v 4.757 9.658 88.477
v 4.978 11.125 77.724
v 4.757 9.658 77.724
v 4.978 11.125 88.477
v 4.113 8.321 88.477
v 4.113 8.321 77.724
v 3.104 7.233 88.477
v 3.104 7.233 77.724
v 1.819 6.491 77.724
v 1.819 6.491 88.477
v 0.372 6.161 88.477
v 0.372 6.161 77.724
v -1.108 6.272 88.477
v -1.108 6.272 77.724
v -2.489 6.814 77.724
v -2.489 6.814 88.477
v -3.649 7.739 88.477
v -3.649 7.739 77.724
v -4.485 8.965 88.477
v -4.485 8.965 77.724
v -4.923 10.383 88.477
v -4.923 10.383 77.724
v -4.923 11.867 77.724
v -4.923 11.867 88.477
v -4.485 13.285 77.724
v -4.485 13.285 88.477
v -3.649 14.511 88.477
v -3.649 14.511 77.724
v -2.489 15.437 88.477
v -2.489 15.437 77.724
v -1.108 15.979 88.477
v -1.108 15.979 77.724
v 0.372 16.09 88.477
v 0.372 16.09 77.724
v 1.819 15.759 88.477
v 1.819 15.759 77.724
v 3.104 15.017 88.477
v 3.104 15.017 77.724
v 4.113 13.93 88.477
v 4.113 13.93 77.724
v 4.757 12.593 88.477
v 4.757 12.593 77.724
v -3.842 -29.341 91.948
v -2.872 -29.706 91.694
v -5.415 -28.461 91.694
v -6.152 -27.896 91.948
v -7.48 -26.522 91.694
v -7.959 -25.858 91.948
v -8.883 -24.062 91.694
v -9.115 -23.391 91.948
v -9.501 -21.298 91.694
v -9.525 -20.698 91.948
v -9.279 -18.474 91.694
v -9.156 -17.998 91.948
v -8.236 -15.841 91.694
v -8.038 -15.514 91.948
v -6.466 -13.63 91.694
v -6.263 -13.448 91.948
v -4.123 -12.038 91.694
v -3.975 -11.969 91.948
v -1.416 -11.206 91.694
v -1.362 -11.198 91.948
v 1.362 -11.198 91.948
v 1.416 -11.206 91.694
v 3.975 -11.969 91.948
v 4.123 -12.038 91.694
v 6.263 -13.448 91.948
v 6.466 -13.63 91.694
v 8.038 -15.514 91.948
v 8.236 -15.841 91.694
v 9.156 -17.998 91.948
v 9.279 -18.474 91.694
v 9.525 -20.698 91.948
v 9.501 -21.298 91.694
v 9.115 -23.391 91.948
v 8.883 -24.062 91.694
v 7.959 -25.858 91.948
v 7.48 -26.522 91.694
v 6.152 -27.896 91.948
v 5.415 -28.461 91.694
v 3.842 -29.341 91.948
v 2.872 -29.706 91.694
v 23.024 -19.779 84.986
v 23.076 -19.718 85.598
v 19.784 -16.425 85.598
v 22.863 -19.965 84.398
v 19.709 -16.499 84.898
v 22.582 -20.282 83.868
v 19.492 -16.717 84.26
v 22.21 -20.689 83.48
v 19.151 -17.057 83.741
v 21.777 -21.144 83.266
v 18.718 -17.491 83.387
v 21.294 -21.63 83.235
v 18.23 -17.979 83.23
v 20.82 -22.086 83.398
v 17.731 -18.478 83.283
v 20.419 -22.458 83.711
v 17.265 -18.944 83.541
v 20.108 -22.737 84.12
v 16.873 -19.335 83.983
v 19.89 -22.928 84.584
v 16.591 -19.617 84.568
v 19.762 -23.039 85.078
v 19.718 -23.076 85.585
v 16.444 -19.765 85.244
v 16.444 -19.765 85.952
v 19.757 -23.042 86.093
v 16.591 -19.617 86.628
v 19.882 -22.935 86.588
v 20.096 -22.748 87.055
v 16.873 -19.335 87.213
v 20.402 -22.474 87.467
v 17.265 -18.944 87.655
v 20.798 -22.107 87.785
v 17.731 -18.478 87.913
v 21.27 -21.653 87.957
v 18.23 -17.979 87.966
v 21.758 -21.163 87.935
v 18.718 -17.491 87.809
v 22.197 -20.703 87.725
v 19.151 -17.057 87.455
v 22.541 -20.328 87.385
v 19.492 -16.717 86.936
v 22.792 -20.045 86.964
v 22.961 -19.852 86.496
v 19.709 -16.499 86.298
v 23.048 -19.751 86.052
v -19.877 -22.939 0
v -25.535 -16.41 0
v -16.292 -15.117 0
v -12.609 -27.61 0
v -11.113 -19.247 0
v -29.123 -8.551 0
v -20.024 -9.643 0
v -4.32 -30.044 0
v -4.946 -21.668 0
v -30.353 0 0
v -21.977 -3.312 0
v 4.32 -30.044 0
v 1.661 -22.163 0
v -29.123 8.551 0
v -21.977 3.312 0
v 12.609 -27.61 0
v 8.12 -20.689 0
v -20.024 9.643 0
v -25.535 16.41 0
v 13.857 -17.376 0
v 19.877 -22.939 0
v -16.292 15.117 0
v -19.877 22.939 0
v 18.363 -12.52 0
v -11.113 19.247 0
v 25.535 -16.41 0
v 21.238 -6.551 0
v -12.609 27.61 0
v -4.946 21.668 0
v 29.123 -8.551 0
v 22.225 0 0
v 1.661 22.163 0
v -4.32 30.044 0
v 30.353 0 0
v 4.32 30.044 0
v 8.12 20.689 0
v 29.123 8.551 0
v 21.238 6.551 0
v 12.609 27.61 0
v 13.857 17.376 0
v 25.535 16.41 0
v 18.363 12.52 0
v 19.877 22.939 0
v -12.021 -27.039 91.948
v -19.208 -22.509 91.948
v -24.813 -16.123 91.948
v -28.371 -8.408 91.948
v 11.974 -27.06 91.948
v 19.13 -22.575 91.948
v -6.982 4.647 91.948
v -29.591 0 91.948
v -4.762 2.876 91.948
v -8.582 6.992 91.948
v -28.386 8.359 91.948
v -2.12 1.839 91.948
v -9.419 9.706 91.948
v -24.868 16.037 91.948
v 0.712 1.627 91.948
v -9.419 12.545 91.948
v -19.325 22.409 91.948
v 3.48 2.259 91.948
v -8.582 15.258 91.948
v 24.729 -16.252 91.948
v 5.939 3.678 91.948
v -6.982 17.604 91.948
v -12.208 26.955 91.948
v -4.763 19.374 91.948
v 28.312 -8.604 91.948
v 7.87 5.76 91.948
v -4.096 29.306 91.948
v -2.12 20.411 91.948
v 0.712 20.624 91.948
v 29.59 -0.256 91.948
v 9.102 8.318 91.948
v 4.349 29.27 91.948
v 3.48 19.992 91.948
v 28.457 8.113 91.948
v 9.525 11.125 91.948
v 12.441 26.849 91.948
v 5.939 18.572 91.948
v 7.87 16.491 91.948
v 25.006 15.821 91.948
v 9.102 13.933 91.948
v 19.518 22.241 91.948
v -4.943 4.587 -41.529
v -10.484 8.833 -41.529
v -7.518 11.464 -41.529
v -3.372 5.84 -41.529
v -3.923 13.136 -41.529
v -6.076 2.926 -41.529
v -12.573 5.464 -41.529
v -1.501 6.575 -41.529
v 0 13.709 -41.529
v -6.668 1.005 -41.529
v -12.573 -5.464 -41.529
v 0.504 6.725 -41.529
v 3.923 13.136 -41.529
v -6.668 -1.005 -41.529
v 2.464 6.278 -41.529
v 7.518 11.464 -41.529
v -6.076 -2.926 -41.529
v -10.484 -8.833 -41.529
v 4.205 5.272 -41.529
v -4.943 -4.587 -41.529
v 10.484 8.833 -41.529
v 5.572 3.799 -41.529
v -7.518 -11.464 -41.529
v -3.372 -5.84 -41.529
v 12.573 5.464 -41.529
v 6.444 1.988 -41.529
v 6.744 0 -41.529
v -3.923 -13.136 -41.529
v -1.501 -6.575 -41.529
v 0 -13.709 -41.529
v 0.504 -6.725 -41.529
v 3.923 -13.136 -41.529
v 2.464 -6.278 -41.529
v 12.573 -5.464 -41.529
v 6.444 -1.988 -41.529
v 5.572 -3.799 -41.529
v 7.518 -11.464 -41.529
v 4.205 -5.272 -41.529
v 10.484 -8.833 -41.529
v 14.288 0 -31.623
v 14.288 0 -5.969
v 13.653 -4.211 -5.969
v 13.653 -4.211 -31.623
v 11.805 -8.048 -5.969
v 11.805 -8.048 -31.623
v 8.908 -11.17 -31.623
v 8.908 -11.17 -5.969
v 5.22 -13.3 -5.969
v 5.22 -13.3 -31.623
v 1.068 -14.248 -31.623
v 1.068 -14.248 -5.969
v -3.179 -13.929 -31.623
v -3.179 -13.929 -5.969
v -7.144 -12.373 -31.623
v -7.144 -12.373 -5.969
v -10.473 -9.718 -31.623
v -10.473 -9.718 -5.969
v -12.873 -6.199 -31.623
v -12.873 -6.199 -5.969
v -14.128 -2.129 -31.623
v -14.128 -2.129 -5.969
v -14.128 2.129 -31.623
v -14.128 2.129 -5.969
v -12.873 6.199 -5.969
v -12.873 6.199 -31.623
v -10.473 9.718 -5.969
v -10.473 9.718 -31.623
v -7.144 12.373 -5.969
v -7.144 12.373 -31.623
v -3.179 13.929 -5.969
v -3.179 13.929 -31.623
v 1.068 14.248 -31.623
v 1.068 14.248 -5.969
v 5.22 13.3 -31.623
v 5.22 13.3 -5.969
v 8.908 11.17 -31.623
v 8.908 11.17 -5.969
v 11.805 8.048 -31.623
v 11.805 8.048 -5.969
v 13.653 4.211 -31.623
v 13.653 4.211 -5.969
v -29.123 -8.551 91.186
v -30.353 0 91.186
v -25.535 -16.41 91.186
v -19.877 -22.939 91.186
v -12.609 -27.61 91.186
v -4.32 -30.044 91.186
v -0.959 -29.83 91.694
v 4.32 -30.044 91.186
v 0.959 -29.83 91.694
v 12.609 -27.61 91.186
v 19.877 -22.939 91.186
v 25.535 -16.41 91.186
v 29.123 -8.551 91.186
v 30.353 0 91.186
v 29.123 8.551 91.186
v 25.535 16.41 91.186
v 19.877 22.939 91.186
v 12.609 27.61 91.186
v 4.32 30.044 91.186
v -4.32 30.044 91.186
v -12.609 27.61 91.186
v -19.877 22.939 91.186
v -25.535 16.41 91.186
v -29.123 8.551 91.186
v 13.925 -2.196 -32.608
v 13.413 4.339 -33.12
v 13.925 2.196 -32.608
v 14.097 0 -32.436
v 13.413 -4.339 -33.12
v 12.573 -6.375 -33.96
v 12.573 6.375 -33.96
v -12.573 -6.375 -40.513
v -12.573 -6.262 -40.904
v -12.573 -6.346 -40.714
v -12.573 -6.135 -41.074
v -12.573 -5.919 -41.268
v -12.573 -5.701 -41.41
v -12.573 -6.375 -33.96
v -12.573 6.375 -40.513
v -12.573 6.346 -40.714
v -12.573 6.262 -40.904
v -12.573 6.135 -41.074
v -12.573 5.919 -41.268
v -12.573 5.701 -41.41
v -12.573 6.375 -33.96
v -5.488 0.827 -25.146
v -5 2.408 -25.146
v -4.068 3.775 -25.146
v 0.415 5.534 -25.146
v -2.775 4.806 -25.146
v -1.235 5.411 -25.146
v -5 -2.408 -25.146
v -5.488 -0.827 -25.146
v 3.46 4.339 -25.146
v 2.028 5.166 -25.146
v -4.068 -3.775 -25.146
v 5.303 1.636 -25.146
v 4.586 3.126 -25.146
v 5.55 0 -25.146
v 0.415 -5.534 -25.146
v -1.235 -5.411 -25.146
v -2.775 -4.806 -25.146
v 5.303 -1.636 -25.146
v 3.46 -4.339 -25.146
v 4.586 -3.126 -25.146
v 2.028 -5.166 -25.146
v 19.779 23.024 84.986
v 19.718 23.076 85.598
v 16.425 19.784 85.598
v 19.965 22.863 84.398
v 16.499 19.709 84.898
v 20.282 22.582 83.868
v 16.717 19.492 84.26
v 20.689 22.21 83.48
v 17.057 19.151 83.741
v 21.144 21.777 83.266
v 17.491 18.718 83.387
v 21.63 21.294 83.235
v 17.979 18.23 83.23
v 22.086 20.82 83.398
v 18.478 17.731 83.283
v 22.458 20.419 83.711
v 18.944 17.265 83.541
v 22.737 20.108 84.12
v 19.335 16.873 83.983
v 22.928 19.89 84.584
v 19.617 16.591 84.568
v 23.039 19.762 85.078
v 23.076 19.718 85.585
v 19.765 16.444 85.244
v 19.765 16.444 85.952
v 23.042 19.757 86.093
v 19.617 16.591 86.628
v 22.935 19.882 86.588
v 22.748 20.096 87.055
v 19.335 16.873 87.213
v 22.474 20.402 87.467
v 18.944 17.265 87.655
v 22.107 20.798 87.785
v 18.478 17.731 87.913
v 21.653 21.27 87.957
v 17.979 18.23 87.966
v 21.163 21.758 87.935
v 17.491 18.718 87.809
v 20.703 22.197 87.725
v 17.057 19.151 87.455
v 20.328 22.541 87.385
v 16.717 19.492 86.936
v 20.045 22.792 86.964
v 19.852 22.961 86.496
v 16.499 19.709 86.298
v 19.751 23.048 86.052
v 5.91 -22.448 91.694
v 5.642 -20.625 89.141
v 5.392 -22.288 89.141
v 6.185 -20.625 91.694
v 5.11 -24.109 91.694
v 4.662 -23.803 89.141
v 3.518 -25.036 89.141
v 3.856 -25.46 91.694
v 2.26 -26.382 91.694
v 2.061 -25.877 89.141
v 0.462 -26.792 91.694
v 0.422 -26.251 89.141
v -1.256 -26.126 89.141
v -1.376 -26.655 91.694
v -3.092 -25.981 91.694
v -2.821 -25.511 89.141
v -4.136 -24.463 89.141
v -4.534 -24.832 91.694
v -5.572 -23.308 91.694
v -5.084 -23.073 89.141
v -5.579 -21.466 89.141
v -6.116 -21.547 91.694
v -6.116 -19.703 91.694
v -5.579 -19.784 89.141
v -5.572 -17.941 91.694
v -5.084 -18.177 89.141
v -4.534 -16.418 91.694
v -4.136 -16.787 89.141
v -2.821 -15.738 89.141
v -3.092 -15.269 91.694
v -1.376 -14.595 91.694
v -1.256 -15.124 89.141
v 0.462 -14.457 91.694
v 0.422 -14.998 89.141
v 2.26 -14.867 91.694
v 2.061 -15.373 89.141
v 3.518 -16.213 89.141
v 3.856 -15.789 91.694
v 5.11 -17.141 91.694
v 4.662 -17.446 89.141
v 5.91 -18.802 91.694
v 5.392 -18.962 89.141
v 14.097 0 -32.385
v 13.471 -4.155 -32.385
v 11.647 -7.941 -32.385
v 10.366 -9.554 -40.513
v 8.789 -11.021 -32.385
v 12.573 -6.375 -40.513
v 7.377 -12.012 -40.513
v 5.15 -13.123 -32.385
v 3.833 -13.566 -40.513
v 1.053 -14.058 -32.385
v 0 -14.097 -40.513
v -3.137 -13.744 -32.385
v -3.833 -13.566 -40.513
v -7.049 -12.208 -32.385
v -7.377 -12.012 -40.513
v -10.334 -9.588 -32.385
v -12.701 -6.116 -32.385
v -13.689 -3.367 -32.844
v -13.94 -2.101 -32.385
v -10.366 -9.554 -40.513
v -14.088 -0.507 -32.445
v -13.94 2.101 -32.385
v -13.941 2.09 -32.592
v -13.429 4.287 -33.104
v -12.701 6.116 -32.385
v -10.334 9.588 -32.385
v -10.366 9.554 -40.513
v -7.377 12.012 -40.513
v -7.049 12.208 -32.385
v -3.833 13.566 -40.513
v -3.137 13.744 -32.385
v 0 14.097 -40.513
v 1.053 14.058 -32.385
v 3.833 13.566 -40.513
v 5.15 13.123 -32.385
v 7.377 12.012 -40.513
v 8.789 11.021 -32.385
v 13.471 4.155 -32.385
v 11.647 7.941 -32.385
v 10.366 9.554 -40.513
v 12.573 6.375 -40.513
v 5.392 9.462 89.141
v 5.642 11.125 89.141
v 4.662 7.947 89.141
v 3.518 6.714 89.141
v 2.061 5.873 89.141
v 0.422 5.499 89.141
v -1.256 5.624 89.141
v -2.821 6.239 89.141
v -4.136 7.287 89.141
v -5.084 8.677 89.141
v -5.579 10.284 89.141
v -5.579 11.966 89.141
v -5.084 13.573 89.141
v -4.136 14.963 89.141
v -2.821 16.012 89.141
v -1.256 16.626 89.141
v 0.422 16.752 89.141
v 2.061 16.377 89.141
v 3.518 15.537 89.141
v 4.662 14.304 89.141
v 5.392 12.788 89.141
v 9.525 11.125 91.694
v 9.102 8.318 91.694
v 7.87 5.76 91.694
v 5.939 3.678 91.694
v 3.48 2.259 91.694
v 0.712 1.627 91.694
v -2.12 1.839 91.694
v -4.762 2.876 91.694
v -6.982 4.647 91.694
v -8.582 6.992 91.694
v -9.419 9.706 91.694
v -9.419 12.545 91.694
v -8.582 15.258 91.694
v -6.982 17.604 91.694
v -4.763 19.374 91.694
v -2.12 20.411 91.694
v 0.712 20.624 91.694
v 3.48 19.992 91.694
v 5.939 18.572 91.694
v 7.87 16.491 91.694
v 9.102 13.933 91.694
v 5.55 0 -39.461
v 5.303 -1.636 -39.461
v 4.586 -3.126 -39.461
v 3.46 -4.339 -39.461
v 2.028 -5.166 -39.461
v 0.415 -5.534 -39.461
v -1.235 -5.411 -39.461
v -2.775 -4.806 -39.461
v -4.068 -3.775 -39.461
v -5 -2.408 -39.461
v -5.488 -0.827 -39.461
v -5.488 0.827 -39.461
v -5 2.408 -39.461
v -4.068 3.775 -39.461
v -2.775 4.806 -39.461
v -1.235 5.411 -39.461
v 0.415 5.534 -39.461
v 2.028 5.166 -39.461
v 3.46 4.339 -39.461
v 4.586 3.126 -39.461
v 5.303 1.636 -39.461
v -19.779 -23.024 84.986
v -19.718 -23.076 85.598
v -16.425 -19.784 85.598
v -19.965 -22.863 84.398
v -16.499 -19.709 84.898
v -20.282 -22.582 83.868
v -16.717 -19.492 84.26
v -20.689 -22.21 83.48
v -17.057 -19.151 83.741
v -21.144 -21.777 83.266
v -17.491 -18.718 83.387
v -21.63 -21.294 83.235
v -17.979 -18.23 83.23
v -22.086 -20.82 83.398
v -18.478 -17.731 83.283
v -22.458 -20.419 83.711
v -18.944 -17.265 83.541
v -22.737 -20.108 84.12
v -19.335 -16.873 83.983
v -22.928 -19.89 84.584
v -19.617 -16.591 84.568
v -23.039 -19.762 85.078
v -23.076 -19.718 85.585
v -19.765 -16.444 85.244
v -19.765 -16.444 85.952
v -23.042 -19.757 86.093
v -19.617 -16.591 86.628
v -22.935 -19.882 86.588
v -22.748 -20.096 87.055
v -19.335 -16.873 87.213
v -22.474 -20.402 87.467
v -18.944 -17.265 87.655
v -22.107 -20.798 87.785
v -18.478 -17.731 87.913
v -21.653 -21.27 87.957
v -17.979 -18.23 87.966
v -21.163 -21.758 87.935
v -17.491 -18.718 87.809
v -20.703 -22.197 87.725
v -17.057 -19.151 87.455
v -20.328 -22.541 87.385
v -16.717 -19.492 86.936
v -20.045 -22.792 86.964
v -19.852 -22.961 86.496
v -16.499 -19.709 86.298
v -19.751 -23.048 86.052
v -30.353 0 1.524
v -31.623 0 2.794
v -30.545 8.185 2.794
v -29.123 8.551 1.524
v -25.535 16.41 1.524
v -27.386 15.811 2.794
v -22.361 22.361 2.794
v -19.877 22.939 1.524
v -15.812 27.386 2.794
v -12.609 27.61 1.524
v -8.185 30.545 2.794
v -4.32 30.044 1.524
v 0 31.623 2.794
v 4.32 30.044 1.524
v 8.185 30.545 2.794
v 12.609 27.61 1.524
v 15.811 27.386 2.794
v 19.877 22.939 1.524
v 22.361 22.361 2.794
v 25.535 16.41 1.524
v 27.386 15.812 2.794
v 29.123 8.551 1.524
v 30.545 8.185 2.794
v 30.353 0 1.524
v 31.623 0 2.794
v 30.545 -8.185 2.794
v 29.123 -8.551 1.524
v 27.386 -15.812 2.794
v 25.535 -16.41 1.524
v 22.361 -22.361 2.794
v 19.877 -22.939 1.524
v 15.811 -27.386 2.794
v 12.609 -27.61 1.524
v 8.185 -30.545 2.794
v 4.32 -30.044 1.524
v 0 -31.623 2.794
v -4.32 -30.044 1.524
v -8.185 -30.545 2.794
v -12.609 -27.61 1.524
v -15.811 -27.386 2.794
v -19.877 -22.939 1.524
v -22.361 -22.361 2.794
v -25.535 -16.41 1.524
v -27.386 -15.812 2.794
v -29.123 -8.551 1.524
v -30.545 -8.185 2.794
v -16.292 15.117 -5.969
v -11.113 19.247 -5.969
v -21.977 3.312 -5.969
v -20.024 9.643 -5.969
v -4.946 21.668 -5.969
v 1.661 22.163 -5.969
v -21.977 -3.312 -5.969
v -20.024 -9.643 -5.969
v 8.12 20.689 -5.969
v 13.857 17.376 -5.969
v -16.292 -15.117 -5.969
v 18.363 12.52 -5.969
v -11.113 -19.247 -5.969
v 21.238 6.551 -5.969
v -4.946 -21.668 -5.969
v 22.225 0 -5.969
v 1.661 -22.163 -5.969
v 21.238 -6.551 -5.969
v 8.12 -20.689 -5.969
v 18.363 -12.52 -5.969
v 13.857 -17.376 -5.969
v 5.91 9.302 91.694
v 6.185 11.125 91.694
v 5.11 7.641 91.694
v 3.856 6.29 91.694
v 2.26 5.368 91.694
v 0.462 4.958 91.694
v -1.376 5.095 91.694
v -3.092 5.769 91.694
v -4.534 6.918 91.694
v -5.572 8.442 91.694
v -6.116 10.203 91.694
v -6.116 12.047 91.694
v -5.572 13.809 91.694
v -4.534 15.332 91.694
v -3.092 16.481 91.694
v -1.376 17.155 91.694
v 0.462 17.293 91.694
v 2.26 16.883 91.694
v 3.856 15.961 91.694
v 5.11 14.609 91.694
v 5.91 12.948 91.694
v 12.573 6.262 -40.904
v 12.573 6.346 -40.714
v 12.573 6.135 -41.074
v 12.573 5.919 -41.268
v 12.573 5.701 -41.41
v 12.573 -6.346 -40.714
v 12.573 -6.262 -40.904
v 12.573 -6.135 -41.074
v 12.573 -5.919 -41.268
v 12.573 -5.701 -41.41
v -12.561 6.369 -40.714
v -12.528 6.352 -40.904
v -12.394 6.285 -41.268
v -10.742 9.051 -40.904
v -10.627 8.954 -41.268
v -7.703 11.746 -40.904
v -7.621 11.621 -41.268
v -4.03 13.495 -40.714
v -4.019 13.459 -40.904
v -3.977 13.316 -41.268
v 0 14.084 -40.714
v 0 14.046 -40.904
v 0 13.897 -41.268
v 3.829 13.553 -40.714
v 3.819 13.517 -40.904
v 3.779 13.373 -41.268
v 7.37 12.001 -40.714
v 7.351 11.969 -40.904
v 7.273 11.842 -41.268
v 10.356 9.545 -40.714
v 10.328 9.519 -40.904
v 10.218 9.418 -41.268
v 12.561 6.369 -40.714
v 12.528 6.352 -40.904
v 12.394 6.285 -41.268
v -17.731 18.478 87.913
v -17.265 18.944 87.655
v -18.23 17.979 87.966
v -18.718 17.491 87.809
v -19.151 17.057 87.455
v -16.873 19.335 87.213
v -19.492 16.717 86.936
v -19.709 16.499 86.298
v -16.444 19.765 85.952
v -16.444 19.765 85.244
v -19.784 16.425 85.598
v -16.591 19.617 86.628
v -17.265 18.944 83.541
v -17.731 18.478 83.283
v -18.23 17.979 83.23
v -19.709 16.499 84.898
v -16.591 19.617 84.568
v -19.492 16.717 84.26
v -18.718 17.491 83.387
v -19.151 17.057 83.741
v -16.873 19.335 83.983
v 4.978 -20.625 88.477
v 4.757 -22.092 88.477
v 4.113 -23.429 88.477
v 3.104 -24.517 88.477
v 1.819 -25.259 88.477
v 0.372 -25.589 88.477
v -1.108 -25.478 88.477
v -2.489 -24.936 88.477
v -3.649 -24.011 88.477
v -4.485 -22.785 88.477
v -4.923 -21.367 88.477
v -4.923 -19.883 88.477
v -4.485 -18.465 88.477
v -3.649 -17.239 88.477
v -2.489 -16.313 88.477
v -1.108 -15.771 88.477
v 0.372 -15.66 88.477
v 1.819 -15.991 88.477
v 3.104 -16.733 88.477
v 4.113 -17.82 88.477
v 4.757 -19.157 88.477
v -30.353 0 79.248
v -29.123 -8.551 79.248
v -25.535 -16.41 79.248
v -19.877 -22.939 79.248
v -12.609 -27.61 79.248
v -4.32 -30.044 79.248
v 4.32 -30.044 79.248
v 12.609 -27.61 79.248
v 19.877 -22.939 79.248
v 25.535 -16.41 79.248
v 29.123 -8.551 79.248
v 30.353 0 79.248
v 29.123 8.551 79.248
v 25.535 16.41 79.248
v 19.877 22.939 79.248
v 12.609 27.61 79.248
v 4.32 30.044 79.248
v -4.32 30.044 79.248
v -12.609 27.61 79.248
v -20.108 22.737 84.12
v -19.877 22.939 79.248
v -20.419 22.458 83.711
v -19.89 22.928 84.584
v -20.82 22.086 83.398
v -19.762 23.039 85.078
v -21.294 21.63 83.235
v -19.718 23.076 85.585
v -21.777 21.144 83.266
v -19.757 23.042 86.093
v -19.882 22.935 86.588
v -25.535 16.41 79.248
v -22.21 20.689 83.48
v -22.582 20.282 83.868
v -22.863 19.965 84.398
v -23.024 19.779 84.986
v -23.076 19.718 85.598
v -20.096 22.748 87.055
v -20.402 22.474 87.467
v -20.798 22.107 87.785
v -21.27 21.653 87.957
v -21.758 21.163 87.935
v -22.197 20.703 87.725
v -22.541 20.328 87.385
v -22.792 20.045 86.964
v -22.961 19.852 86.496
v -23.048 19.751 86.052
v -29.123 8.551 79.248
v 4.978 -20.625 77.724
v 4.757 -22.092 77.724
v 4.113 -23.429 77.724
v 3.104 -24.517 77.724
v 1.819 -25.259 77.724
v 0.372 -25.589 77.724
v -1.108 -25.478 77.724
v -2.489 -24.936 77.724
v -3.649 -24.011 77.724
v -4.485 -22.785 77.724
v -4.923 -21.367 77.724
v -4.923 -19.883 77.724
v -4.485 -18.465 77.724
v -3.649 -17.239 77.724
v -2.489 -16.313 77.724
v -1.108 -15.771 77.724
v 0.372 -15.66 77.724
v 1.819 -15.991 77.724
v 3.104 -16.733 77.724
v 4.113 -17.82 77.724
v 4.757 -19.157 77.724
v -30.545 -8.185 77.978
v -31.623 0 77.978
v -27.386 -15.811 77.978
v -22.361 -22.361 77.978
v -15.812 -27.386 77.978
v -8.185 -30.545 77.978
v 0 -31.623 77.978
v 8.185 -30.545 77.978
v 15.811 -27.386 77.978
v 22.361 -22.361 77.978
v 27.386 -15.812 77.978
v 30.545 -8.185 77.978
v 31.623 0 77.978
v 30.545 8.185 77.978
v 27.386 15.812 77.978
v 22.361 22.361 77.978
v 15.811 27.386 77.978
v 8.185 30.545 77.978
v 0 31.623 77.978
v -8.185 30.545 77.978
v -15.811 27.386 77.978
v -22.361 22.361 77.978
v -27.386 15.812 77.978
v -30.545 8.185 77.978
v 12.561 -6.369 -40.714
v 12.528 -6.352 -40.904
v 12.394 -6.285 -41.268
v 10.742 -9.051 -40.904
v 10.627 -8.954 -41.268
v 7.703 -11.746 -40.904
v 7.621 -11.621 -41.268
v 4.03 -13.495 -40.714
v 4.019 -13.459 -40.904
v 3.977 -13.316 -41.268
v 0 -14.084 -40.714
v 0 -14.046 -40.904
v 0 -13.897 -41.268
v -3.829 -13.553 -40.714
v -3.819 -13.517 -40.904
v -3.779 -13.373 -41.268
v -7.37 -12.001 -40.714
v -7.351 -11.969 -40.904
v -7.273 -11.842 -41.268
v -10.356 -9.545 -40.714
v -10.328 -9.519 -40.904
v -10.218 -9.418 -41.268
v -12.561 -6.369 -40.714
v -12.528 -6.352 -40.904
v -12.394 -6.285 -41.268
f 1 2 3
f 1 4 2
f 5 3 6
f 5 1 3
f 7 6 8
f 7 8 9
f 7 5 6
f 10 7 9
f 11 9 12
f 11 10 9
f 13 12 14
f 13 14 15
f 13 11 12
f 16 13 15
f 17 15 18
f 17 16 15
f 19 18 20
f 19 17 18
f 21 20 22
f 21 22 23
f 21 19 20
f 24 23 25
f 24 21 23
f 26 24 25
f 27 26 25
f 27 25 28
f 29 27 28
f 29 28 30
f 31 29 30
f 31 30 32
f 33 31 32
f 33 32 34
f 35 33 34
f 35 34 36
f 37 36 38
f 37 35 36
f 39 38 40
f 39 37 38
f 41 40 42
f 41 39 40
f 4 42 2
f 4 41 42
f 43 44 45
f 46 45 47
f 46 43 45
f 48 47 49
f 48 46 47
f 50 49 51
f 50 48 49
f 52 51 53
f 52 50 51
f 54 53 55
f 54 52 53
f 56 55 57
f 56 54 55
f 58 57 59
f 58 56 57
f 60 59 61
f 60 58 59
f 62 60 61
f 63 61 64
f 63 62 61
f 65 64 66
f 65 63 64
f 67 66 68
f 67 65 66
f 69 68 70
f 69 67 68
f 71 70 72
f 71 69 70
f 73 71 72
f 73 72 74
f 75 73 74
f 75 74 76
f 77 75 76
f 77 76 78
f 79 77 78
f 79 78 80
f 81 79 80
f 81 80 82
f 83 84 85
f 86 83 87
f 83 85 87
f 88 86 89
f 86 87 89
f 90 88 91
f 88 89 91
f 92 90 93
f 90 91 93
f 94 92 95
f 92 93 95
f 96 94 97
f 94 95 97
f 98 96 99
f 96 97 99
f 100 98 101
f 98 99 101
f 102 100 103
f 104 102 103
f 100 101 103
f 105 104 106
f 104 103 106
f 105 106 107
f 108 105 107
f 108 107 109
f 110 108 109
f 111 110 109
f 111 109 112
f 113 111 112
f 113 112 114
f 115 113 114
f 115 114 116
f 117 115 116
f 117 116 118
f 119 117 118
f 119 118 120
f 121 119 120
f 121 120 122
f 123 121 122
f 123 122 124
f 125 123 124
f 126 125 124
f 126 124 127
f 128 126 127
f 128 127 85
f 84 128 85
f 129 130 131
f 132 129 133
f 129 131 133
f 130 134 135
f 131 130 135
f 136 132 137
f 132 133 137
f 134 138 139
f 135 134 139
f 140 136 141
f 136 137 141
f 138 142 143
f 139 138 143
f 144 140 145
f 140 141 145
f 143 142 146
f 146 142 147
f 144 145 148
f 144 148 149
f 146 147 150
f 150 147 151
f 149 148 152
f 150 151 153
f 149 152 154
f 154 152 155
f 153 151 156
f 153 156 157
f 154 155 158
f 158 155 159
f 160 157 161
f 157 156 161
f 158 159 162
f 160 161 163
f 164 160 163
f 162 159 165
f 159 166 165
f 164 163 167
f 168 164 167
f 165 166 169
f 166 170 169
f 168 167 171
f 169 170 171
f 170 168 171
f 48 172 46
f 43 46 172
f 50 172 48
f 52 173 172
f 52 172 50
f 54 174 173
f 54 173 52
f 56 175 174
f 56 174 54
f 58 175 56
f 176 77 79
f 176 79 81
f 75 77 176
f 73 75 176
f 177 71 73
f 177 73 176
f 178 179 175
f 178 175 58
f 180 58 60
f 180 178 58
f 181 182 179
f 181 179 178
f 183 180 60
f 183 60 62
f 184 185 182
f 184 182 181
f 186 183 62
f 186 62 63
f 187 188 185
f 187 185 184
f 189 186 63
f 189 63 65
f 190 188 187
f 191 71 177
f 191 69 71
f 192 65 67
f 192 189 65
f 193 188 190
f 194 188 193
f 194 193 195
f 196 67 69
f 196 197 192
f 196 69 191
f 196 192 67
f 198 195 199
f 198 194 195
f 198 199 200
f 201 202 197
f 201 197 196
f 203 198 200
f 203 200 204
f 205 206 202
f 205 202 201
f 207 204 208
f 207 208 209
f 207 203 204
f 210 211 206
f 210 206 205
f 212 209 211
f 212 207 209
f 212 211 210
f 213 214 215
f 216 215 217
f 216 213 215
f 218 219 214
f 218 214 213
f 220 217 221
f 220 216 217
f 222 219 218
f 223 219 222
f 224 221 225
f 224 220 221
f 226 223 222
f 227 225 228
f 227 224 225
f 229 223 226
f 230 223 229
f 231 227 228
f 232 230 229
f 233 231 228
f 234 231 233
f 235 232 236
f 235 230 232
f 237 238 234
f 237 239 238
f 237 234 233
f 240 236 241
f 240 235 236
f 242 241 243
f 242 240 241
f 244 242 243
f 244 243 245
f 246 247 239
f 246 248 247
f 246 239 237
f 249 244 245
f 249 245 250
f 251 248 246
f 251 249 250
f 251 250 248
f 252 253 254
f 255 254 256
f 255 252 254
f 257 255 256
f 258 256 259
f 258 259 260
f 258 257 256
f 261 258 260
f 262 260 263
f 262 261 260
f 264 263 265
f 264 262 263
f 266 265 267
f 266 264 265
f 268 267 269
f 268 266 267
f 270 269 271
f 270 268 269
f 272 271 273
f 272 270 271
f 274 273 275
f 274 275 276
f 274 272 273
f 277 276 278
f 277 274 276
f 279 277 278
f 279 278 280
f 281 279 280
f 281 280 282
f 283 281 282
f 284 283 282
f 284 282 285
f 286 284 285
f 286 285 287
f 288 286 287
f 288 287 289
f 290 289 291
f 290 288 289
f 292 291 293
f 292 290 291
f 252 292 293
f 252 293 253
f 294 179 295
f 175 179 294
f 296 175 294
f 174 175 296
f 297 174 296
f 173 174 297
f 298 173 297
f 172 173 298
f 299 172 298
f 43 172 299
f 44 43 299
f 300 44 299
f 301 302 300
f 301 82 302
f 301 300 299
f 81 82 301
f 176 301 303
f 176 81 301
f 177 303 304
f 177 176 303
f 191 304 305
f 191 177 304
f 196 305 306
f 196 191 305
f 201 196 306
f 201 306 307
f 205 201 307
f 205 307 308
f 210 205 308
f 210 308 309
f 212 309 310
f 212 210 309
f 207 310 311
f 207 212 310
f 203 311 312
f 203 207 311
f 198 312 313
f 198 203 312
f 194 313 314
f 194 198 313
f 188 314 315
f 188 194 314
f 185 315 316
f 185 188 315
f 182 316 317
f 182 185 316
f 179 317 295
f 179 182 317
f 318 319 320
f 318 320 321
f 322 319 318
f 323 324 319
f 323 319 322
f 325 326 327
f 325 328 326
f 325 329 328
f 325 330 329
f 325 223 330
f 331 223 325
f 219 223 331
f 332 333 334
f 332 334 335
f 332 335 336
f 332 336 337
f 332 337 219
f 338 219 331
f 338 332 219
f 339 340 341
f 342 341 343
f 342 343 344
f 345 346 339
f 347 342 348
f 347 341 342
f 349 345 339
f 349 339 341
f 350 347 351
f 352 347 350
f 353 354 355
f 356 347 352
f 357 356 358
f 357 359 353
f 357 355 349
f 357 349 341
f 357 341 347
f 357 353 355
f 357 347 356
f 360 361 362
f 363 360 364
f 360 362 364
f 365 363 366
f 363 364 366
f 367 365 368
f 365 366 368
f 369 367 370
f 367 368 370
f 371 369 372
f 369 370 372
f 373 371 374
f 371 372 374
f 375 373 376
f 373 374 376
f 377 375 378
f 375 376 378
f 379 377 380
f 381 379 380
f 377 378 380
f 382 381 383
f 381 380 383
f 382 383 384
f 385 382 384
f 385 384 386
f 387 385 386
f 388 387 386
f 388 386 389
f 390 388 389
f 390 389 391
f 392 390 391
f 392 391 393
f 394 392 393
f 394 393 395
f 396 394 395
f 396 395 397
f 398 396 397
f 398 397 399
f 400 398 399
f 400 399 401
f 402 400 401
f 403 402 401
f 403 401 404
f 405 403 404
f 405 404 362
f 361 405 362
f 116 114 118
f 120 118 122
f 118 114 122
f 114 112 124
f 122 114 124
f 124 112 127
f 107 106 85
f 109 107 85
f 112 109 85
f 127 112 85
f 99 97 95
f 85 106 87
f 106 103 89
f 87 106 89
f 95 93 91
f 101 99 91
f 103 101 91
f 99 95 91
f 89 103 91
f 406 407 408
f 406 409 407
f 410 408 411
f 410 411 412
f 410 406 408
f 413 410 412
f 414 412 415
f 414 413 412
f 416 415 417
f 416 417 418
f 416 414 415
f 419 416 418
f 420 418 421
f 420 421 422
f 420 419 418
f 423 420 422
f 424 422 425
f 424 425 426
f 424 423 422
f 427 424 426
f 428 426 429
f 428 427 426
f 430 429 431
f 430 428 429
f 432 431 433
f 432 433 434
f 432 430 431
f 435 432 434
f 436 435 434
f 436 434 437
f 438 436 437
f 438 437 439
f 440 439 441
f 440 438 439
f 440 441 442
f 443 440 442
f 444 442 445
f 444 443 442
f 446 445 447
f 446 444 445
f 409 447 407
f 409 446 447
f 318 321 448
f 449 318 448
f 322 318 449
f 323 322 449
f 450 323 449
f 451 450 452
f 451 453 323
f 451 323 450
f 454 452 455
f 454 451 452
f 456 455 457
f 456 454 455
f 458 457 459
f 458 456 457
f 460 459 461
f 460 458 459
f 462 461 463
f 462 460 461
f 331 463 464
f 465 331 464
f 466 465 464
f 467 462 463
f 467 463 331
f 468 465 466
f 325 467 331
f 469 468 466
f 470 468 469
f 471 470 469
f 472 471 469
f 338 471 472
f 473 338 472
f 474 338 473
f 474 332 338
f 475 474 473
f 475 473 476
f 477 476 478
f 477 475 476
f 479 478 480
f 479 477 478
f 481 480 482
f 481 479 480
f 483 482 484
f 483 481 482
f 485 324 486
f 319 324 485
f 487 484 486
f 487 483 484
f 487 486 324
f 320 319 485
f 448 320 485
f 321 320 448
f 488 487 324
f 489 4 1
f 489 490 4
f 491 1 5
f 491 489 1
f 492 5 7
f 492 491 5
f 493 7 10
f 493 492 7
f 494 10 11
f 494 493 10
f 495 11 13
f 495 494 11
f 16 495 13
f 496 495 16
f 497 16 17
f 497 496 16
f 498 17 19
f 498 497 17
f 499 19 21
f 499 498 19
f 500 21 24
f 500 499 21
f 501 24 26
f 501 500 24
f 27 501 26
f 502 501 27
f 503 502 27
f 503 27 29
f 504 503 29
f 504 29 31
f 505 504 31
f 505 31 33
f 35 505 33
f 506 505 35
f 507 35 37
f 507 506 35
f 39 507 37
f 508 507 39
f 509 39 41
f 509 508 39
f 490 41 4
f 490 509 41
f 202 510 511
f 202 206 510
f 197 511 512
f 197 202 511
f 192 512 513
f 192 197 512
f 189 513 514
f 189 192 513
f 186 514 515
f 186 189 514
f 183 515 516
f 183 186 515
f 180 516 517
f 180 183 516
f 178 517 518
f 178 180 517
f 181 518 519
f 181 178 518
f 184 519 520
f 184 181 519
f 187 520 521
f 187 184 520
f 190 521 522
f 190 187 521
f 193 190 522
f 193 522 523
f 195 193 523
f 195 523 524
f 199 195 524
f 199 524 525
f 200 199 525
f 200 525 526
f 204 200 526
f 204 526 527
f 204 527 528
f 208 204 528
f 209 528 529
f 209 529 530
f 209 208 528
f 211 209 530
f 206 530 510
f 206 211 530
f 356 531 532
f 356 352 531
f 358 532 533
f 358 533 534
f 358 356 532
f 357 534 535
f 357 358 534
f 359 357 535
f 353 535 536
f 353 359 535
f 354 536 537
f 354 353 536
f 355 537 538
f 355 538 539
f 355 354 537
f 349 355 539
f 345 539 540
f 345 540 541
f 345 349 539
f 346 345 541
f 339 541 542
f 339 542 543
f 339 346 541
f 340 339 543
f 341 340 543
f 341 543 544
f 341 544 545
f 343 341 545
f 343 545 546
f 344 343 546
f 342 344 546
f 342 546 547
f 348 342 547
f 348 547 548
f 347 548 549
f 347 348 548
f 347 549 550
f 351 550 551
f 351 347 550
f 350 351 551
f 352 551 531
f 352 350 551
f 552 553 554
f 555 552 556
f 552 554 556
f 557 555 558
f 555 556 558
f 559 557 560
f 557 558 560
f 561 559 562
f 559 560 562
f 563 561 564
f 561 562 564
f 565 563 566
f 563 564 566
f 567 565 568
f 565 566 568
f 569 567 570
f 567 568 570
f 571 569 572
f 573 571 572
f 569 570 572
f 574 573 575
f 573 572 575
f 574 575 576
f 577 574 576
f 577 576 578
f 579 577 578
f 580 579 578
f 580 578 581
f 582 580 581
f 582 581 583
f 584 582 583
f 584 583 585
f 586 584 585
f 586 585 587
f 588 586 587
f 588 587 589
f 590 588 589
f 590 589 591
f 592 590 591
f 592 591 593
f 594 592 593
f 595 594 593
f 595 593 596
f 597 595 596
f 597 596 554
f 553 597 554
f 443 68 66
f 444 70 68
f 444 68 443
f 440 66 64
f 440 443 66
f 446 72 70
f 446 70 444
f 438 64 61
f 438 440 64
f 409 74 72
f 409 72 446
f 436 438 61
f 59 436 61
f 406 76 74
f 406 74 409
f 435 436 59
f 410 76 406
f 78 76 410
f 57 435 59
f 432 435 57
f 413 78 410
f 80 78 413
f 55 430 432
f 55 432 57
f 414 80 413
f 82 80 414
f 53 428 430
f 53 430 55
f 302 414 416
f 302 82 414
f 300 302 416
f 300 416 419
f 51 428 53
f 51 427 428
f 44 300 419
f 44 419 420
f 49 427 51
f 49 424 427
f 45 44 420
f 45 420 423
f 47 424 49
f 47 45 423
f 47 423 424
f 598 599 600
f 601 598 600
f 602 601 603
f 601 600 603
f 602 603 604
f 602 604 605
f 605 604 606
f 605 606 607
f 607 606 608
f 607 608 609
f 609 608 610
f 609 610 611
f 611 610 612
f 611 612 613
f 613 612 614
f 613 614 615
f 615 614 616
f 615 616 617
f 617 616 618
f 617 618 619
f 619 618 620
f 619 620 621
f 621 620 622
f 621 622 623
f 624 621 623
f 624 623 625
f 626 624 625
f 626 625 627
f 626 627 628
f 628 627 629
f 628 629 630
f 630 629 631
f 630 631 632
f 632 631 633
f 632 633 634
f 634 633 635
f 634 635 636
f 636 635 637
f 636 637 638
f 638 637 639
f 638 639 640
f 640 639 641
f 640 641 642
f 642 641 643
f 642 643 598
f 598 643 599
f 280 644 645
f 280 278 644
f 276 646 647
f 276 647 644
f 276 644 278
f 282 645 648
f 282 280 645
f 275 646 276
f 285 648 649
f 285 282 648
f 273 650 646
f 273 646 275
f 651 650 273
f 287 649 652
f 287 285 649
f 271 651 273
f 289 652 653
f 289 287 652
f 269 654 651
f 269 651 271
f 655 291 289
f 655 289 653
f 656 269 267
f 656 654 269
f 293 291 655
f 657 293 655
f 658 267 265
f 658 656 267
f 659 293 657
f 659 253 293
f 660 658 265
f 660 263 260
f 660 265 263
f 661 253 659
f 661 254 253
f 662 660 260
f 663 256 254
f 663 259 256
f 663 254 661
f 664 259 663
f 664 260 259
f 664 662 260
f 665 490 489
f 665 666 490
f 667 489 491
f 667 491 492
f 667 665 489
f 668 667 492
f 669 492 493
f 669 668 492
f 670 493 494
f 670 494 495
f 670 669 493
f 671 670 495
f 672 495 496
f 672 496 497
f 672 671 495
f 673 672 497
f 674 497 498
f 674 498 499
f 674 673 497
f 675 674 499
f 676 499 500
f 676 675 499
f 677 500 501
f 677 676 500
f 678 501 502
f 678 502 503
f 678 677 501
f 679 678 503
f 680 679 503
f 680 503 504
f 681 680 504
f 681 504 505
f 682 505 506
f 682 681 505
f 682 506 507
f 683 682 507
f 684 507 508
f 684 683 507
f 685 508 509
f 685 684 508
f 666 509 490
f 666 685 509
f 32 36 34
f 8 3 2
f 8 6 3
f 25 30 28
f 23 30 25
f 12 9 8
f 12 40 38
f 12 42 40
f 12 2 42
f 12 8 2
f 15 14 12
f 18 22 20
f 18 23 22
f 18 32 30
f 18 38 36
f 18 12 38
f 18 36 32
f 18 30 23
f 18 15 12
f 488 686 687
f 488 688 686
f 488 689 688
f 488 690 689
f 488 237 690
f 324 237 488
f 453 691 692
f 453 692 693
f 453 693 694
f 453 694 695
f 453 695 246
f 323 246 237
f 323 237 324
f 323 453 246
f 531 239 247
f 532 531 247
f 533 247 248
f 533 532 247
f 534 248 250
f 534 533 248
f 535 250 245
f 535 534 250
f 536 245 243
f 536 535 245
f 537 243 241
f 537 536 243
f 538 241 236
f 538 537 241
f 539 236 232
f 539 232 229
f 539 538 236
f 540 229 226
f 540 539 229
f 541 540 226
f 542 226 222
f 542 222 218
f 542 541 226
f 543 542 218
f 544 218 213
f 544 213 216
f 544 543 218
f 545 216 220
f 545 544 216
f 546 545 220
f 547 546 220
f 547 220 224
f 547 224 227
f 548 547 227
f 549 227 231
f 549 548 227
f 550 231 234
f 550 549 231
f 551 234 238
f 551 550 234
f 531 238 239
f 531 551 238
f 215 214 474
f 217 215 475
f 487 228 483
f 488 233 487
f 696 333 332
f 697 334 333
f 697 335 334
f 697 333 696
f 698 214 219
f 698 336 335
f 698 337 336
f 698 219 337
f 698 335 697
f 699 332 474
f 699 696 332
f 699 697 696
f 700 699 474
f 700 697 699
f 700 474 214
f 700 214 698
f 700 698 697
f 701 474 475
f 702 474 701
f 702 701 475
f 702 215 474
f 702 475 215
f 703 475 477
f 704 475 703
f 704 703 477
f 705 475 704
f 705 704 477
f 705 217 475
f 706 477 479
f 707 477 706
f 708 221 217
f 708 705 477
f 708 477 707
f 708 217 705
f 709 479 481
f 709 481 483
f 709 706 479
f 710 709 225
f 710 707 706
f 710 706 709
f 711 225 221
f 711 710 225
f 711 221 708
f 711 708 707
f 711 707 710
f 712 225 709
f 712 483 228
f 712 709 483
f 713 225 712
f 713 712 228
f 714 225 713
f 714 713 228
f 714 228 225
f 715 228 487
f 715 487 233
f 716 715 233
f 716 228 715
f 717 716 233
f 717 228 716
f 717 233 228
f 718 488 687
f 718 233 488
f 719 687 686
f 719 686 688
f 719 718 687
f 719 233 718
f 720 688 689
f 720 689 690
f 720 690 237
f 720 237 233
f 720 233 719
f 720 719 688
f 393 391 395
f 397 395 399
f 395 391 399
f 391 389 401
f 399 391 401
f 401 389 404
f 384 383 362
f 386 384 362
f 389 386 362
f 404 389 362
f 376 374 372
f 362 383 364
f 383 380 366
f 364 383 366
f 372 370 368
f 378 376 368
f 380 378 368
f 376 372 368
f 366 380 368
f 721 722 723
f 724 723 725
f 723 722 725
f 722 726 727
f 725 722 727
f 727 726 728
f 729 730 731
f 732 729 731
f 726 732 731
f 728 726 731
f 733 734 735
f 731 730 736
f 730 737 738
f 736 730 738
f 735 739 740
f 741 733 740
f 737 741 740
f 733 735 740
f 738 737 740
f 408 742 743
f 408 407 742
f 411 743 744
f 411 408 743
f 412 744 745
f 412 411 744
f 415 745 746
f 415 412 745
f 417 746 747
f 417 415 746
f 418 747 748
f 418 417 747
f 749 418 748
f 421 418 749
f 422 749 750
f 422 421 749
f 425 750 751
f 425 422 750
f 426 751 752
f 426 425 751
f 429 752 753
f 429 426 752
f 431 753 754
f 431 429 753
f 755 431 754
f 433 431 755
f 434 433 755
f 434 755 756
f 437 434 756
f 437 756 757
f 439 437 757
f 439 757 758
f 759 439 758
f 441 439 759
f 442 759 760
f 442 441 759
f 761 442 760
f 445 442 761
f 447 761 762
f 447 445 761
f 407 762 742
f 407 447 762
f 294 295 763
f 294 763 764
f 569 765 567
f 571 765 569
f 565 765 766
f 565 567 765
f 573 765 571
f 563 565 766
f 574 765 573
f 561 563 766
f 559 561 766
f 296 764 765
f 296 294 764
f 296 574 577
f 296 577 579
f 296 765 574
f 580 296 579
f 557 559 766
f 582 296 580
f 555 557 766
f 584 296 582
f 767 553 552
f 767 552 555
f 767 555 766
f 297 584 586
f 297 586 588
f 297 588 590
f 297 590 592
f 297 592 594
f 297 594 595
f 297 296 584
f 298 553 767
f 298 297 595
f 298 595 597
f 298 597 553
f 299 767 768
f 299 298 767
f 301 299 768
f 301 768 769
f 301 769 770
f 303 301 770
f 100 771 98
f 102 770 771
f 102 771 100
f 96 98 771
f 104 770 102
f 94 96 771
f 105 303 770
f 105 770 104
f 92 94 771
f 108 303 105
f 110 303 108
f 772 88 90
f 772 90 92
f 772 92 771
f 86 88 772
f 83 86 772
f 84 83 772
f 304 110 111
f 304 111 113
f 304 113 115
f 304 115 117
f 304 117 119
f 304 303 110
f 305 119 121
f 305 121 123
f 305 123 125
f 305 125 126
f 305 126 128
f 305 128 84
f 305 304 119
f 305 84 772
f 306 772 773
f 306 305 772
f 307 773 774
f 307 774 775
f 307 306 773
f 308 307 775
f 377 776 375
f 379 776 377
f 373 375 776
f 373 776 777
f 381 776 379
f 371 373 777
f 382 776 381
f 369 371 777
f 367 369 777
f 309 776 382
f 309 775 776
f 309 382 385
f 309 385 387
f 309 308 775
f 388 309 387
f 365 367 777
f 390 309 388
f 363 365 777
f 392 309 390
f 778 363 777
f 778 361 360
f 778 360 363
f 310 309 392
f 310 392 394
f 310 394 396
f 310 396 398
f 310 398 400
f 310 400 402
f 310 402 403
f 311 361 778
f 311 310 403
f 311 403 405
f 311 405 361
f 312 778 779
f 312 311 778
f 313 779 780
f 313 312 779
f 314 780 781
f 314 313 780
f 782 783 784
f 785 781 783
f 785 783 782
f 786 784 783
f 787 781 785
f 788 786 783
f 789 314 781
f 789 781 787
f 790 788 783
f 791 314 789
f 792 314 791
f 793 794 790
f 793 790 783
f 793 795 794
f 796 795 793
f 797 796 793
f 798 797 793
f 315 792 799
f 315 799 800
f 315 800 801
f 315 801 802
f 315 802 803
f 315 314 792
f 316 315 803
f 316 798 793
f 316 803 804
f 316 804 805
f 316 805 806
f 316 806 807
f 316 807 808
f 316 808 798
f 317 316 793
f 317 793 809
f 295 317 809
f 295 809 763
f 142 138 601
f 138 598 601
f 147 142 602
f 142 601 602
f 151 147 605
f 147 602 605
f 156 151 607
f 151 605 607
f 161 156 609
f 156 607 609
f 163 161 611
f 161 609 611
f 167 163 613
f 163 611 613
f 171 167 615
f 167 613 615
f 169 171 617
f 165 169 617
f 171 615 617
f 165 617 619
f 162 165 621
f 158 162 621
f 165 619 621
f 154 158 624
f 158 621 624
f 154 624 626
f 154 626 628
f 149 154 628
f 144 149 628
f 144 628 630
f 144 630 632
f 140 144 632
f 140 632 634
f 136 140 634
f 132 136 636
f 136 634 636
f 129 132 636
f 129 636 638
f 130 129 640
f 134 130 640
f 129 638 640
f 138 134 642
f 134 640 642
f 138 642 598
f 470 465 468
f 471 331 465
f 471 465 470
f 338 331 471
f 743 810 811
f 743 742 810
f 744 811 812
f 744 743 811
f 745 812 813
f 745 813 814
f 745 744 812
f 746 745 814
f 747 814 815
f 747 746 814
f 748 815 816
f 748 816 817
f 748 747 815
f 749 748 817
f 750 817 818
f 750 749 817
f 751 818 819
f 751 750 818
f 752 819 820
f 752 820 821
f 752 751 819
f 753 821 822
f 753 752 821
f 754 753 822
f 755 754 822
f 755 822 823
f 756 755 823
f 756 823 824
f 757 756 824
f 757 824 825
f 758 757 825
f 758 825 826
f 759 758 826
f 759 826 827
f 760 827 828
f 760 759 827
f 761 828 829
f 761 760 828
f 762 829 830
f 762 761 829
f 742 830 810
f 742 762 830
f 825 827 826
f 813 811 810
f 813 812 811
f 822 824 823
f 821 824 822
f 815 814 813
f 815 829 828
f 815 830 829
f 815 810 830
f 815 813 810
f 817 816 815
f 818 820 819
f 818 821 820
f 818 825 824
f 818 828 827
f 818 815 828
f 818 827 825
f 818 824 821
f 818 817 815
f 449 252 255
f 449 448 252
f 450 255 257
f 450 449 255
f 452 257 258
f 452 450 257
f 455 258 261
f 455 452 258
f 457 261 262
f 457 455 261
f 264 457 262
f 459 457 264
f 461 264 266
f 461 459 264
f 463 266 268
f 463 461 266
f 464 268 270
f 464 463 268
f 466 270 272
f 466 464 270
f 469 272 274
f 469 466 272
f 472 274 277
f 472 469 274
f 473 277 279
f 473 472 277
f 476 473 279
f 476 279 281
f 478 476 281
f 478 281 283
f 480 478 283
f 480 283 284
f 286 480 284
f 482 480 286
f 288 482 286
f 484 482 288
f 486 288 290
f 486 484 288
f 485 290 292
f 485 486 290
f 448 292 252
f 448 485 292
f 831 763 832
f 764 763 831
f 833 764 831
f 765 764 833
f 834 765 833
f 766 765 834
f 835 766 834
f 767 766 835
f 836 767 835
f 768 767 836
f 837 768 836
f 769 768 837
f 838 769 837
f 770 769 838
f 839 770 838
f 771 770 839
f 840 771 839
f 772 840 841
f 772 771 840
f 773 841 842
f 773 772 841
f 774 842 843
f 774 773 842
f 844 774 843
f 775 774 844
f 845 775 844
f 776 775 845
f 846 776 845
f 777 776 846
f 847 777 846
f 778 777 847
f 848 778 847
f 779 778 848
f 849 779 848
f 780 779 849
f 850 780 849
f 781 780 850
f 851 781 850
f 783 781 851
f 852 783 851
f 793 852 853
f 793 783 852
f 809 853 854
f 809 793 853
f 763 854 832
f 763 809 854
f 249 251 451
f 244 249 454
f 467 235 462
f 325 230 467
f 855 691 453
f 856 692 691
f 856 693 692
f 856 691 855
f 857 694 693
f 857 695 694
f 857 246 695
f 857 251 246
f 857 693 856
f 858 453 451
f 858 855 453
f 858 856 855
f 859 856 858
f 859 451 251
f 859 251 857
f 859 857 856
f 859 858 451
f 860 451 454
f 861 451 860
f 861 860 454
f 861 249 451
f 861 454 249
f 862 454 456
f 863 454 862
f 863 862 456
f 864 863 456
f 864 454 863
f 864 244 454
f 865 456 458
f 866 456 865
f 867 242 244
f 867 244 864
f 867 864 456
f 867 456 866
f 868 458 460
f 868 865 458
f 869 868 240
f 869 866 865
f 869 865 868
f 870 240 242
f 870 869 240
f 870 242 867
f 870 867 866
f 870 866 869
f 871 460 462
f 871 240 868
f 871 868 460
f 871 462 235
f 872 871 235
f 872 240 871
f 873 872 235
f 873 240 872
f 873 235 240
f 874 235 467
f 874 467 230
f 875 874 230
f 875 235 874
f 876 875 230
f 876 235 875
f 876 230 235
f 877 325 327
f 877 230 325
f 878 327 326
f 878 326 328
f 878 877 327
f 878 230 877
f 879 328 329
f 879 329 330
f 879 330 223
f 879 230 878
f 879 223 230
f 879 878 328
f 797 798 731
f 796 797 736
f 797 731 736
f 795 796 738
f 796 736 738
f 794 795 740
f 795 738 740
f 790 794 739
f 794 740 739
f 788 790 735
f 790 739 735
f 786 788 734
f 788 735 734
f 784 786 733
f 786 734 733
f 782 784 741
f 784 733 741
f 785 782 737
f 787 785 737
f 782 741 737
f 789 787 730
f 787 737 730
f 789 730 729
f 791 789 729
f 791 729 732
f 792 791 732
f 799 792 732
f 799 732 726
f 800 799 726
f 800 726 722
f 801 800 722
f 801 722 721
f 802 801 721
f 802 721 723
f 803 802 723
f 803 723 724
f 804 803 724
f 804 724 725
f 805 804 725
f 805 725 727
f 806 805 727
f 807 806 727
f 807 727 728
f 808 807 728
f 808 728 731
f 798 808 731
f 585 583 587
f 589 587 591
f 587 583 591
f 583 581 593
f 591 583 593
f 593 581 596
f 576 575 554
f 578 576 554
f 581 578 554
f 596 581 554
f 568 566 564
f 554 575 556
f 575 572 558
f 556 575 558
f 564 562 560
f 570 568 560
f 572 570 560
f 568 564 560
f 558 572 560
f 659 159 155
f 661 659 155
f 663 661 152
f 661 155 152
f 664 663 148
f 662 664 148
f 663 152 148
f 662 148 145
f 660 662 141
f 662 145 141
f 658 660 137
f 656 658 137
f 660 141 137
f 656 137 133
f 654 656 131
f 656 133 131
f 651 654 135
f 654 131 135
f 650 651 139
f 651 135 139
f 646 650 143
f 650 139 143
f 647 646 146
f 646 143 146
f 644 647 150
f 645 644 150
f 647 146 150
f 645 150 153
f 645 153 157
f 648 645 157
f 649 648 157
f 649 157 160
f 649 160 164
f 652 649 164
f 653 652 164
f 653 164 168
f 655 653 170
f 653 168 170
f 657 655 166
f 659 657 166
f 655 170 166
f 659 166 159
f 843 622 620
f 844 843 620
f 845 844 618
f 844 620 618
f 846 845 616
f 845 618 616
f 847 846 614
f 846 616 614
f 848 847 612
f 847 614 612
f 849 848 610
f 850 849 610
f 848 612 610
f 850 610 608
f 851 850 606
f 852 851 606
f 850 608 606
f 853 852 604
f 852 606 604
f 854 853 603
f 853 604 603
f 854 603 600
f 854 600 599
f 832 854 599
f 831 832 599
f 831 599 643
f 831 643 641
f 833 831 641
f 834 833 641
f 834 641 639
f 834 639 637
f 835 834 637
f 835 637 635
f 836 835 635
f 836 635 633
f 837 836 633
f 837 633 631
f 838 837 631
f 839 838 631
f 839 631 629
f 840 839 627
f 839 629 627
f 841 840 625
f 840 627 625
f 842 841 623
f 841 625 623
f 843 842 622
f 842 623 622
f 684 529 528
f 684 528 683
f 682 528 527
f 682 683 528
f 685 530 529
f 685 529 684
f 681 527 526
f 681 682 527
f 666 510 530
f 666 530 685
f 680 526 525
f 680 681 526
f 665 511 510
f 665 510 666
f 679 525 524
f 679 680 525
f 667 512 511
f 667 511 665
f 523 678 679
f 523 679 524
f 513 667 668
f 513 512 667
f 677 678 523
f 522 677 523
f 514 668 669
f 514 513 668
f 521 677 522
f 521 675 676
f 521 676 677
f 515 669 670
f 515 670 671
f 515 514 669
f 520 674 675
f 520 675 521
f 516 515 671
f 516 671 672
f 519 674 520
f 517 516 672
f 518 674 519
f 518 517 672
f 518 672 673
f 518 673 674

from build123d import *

# Parameters (mm, degrees)
SKETCH1_R          = 31.623
EXTRUDE1_DEPTH     = 91.948
CHAMFER1_SIZE      = 0.762
SKETCH6_R          = 22.225
EXTRUDE2_DEPTH     = 5.969
SKETCH7_W          = 35.56
SKETCH7_H          = 14.2875
CUT_EXTRUDE4_DEPTH = 19.84248
HOLE1_D            = 4.7498
HOLE1_DEPTH        = 4.7498
CIRPATTERN1_COUNT  = 4
LPATTERN2_COUNT    = 2
LPATTERN2_PITCH    = 31.75


with BuildPart() as part:
    # Sketch1 → Extrude1 (new body)
    with BuildSketch(Plane.XY):
        Circle(SKETCH1_R)
    extrude(amount=EXTRUDE1_DEPTH)

    # Sketch2 → Cut-Revolve1 (revolve, cut)
    with BuildSketch(Plane(origin=(0, 0, 0), x_dir=(1, 0, 0), z_dir=(0, 1, 0)), mode=Mode.PRIVATE) as cut_revolve1_sk:
        Polygon((31.623, -91.948), (31.623, -77.978), (30.353, -79.248), (30.353, -91.948), align=None)
    revolve(cut_revolve1_sk.sketch.rotate(Axis((0, 0, 0), (0, 0, 1)), 180), axis=Axis((0, 0, 0), (0, 0, 1)), mode=Mode.SUBTRACT)  # turned: the seam where the file's is

    # Sketch3 → Cut-Revolve2 (revolve, cut)
    with BuildSketch(Plane(origin=(0, 0, 0), x_dir=(1, 0, 0), z_dir=(0, 1, 0)), mode=Mode.PRIVATE) as cut_revolve2_sk:
        Polygon((30.353, 0), (30.353, -1.524), (31.623, -2.794), (31.623, 0), align=None)
    revolve(cut_revolve2_sk.sketch.rotate(Axis((0, 0, 0), (0, 0, -1)), 180), axis=Axis((0, 0, 0), (0, 0, -1)), mode=Mode.SUBTRACT)  # turned: the seam where the file's is

    # S2D0002 → Cut-Revolve3 (revolve, cut)
    with BuildSketch(Plane(origin=(0, 0, 0), x_dir=(0, -1, 0), z_dir=(1, 0, 0)), mode=Mode.PRIVATE) as cut_revolve3_sk:
        Polygon((-4.9403, -91.694), (-1.6002, -91.694), (-1.6002, -91.948), (-11.1252, -91.948), (-11.1252, -77.724), (-6.1468, -77.724), (-6.1468, -88.477393135), (-5.482893135, -89.1413), align=None)
    cut_revolve3 = revolve(cut_revolve3_sk.sketch.rotate(Axis((0, 11.1252, 14.6685), (0, 0, -1)), 270), axis=Axis((0, 11.1252, 14.6685), (0, 0, -1)), mode=Mode.SUBTRACT)  # turned: the seam where the file's is

    # Chamfer1
    chamfer1_edges = [part.edges().sort_by_distance(p)[0] for p in [
        (30.353, 0, 91.948),
    ]]
    chamfer(chamfer1_edges, length=CHAMFER1_SIZE)

    # Sketch6 → Extrude2 (add)
    with BuildSketch(Plane(origin=(0, 0, 0), x_dir=(-1, 0, 0), z_dir=(0, 0, -1))):
        with Locations(Location((0, 0, 0), (0, 0, 180))):  # turned: the seam where the file's is
            Circle(SKETCH6_R)
    extrude(amount=EXTRUDE2_DEPTH)

    # Sketch7 → Revolve1 (revolve)
    with BuildSketch(Plane(origin=(0, 0, 0), x_dir=(0, 0, -1), z_dir=(1, 0, 0)), mode=Mode.PRIVATE) as revolve1_sk:
        with Locations((23.749, -7.14375)):
            Rectangle(SKETCH7_W, SKETCH7_H)
    revolve(revolve1_sk.sketch.rotate(Axis((0, 0, 0), (0, 0, -1)), 270), axis=Axis((0, 0, 0), (0, 0, -1)))  # turned: the seam where the file's is

    # S2D0001 → Cut-Revolve5 (revolve, cut)
    with BuildSketch(Plane(origin=(0, 0, 0), x_dir=(1, 0, 0), z_dir=(0, 1, 0))):
        Polygon((5.5499, 39.461277746), (5.5499, 25.146), (0, 25.146), (0, 41.529), (6.7437, 41.529), align=None)
    revolve(axis=Axis((0, 0, 31.308359971), (0, 0, -1)), mode=Mode.SUBTRACT)

    # Sketch9 → Cut-Revolve6 (revolve, cut)
    with BuildSketch(Plane(origin=(0, 0, 0), x_dir=(0, -1, 0), z_dir=(1, 0, 0)), mode=Mode.PRIVATE) as cut_revolve6_sk:
        with BuildLine():
            Line((-14.2875, 31.623), (-14.097, 32.385))
            Line((-14.097, 32.385), (-14.097, 40.513))
            ThreePointArc((-14.097, 40.513), (-13.996678675, 41.056796865), (-13.708922533, 41.529))
            Line((-13.708922533, 41.529), (-14.2875, 41.529))
            Line((-14.2875, 41.529), (-14.2875, 31.623))
        make_face()
    revolve(cut_revolve6_sk.sketch.rotate(Axis((0, 0, -12.65936), (0, 0, -1)), 90), axis=Axis((0, 0, -12.65936), (0, 0, -1)), mode=Mode.SUBTRACT)  # turned: the seam where the file's is

    # Sketch13 → Cut-Extrude4 (cut, symmetric)
    with BuildSketch(Plane(origin=(0, 0, 0), x_dir=(1, 0, 0), z_dir=(0, 1, 0))):
        Polygon((12.573, 41.529), (12.573, 33.9598), (14.2875, 32.2453), (14.2875, 41.529), align=None)
        Polygon((-12.573, 41.529), (-12.573, 33.9598), (-14.2875, 32.2453), (-14.2875, 41.529), align=None)
    extrude(amount=CUT_EXTRUDE4_DEPTH, both=True, mode=Mode.SUBTRACT)

    # Hole1
    with Locations(Plane(origin=(-21.462812129, 21.462812129, 85.598), x_dir=(0.707106781, 0.707106781, 0), z_dir=(-0.707106781, 0.707106781, 0))):
        with Locations((0, 0)):
            hole1 = Hole(HOLE1_D / 2, depth=HOLE1_DEPTH)

    # CirPattern1: Hole1 ×4 about axis
    cirpattern1_axis = Axis((0, 0, 0), (0, 0, 1))
    for i in range(1, CIRPATTERN1_COUNT):
        add(hole1.rotate(cirpattern1_axis, i * 360 / CIRPATTERN1_COUNT), mode=Mode.SUBTRACT)

    # LPattern2: Cut-Revolve3 ×2
    with Locations(*[(0, -i * LPATTERN2_PITCH, 0) for i in range(1, LPATTERN2_COUNT)]):
        add(cut_revolve3, mode=Mode.SUBTRACT)


solid = part.part
